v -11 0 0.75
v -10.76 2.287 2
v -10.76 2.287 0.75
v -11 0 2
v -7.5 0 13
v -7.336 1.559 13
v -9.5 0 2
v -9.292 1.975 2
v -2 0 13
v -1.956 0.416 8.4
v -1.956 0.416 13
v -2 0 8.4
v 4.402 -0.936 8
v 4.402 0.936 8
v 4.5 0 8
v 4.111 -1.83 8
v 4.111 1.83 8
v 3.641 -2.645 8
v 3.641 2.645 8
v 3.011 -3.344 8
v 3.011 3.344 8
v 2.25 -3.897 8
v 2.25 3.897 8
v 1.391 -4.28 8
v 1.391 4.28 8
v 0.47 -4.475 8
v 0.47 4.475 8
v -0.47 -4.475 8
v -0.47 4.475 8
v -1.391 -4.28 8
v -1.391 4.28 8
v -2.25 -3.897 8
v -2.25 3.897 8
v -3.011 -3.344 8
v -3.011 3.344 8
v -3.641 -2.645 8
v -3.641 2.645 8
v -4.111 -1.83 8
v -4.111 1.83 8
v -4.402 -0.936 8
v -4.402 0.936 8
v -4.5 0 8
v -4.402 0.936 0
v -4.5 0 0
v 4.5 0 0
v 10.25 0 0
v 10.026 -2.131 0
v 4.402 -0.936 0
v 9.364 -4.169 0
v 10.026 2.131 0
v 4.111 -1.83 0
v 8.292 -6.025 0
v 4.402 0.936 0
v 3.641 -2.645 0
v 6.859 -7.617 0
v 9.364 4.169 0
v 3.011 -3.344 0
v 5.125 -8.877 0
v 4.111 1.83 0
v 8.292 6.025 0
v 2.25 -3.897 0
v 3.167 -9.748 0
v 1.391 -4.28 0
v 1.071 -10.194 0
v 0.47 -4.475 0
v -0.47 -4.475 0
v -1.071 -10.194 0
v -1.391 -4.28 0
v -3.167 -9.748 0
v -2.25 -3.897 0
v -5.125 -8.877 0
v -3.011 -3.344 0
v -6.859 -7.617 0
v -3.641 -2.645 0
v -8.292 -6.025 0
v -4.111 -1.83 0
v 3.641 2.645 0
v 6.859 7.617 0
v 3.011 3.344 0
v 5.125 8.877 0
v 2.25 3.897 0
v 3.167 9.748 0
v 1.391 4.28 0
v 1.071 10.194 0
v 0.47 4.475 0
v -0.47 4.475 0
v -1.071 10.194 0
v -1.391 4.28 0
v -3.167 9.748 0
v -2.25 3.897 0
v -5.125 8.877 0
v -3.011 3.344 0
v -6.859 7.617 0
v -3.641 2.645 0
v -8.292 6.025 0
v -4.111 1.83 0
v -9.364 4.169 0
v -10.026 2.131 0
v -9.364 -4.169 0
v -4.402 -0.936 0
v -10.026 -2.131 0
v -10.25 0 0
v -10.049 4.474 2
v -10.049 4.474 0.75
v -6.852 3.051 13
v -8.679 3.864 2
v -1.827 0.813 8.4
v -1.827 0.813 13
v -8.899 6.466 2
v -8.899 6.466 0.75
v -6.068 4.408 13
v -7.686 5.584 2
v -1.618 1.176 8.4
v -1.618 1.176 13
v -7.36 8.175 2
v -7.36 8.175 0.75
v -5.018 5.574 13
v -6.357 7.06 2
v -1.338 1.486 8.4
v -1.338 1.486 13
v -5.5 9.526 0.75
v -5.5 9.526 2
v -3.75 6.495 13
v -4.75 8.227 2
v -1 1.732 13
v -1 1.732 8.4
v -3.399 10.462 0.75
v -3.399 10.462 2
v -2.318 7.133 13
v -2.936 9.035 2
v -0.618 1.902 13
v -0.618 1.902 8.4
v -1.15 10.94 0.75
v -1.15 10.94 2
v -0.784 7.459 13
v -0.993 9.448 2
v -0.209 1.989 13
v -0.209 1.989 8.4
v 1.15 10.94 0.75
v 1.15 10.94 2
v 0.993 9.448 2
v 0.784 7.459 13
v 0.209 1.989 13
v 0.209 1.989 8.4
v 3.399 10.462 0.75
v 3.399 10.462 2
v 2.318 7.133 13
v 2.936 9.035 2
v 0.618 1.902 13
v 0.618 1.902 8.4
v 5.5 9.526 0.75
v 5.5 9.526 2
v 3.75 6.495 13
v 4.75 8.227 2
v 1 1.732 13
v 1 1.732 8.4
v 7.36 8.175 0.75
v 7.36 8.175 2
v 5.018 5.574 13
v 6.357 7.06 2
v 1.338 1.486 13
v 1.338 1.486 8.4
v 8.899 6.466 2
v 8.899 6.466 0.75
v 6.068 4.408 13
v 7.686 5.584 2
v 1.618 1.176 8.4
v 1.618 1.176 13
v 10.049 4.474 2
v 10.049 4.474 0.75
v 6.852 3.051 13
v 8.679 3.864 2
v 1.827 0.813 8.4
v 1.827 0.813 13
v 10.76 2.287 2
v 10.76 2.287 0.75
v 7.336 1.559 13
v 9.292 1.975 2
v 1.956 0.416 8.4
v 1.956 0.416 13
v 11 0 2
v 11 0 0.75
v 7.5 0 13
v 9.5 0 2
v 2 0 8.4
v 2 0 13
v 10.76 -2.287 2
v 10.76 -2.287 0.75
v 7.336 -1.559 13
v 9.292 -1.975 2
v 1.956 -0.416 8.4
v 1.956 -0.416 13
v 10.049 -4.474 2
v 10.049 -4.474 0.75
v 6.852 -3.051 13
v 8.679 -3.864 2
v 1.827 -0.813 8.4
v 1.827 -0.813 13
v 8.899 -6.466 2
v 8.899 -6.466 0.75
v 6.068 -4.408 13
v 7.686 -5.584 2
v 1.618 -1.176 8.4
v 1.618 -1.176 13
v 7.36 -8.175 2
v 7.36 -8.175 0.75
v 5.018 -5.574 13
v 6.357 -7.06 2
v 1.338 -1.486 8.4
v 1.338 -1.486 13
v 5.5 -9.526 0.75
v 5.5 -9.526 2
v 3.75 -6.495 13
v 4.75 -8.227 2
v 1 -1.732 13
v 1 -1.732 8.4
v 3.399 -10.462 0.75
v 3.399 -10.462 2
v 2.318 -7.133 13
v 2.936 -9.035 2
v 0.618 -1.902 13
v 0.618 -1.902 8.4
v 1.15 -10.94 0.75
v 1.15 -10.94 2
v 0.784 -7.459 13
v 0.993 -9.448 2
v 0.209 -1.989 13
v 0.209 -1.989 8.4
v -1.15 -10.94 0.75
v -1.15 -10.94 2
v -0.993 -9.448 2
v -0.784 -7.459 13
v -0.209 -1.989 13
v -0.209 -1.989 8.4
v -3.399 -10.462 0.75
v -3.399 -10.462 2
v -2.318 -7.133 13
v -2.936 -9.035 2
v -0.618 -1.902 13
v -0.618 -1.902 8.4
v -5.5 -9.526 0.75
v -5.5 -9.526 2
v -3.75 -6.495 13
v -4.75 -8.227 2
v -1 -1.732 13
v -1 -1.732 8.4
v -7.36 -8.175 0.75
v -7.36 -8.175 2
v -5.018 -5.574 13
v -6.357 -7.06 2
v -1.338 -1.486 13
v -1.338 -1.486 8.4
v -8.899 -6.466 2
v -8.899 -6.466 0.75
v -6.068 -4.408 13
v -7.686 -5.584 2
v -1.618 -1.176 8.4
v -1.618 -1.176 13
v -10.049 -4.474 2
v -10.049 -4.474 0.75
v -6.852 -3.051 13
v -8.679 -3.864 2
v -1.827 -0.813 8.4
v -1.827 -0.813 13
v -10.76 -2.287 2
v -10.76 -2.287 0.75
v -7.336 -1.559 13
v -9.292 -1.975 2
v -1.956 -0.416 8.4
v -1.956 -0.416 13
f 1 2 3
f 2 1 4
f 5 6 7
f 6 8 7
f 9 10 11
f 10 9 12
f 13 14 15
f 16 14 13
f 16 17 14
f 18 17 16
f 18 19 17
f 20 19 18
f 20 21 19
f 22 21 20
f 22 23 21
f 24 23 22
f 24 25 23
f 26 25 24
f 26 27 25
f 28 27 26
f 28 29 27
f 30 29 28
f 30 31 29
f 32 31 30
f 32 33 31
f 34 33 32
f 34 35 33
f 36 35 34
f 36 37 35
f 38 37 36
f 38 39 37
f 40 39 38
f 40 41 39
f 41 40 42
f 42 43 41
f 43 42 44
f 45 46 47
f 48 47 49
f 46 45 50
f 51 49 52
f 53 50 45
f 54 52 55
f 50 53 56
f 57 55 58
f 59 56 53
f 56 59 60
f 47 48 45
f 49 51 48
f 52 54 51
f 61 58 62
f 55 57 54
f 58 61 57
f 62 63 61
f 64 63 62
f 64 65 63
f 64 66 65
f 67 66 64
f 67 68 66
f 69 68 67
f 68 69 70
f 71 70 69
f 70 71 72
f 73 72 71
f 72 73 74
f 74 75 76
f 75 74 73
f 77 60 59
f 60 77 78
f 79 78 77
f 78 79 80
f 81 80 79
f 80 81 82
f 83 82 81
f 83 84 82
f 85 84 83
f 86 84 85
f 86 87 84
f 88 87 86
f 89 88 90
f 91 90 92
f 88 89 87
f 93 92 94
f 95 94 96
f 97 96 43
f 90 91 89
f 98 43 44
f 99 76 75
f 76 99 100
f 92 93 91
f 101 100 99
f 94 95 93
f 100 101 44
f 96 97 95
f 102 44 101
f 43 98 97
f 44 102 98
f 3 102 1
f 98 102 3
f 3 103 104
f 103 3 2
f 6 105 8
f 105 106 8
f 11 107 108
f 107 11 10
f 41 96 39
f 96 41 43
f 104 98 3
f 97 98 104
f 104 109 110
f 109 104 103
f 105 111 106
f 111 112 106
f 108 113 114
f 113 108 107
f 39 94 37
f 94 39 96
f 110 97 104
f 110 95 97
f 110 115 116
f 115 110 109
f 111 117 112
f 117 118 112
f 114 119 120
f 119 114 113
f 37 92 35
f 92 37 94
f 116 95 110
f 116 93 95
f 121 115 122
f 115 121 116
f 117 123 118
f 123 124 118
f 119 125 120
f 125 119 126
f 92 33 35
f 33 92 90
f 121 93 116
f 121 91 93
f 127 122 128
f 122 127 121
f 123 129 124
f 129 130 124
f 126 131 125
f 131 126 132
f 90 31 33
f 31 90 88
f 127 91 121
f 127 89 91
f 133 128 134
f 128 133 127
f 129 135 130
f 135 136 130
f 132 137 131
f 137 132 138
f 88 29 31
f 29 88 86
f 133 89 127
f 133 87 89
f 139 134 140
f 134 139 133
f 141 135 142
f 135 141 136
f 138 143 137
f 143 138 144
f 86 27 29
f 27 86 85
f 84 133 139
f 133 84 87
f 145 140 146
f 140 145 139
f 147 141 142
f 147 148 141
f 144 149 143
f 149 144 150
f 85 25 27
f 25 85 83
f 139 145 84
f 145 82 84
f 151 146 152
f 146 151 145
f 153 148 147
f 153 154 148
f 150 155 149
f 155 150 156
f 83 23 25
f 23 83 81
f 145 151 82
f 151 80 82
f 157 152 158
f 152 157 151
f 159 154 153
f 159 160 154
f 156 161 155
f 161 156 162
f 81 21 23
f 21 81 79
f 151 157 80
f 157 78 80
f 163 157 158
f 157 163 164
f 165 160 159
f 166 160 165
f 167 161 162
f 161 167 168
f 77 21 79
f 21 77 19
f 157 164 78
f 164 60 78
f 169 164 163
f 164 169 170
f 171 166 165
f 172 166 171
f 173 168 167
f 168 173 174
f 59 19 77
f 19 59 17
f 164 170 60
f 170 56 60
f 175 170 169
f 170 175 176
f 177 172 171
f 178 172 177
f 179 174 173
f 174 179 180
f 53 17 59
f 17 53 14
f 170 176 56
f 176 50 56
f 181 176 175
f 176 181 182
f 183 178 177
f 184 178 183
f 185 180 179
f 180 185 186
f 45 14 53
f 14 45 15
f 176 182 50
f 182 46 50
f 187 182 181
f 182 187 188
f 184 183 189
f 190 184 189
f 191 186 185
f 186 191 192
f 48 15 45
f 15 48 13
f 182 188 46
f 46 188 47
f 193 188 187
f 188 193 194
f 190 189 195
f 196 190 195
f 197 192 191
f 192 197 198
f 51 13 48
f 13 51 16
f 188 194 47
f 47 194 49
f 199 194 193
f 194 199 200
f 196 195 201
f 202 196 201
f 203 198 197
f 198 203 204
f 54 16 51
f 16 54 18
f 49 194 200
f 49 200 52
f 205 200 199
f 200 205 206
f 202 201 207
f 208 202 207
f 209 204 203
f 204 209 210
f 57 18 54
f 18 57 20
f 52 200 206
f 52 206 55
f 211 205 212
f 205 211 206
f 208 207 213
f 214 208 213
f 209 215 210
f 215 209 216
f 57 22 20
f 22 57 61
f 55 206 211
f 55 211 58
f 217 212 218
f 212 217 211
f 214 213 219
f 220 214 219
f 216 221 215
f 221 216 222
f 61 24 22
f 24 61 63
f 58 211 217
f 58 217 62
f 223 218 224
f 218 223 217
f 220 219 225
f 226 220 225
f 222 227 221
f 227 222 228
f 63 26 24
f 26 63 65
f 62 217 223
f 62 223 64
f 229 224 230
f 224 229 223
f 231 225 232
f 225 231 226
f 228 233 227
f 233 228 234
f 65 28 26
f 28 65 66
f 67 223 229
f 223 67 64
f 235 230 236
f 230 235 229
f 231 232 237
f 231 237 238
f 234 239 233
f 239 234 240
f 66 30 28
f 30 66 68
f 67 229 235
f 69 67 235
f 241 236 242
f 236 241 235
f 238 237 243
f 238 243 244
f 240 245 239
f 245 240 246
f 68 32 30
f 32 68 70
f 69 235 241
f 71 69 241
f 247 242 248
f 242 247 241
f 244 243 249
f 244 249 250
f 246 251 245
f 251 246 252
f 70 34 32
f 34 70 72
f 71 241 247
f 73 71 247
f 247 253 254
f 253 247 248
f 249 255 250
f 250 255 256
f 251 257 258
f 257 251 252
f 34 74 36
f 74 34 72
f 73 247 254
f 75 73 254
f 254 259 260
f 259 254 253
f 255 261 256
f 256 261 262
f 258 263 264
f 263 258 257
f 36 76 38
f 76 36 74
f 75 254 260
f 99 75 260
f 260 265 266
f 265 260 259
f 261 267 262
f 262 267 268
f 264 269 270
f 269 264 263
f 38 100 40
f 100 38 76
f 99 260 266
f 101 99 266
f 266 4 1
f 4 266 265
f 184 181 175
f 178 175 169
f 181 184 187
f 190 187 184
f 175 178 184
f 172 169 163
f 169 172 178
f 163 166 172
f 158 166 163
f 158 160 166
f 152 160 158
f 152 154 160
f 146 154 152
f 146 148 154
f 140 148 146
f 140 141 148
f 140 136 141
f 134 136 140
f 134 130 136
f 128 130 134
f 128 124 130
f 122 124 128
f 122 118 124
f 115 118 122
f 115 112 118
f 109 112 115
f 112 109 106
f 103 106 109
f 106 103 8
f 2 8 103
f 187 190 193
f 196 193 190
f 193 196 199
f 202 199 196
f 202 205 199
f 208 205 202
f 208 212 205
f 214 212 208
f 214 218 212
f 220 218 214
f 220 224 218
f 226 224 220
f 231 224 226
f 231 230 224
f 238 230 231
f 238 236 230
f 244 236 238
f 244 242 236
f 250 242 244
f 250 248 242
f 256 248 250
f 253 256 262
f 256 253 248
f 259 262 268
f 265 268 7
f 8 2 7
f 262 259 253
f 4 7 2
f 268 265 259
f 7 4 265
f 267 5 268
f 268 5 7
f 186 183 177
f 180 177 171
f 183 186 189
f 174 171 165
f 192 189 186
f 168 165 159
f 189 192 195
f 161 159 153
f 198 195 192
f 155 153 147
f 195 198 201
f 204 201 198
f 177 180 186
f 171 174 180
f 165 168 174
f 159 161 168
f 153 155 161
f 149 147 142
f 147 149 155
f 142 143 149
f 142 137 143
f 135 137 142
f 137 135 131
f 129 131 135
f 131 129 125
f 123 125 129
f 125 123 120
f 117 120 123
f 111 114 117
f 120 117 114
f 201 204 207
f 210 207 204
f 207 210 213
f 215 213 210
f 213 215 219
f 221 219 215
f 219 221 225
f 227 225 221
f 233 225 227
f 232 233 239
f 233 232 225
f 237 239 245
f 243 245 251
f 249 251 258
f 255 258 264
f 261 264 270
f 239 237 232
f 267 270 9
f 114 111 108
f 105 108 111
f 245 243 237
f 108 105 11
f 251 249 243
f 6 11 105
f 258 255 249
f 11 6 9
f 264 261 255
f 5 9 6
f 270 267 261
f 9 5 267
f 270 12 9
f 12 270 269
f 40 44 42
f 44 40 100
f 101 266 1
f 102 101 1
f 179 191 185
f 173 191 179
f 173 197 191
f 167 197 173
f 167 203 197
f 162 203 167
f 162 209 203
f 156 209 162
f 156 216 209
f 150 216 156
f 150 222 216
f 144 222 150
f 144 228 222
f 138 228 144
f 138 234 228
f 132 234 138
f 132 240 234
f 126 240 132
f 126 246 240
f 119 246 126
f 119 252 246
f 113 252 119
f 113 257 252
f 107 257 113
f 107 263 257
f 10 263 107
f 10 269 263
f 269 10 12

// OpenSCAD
/*
 * Pipe (or Scooter Handle) Plug (Parametric), v0.42
 *
 * by Alex Franke (CodeCreations), Jan 2013
 * http://www.theFrankes.com
 * 
 * Licenced under Creative Commons Attribution - Non-Commercial - Share Alike 3.0 
 * 
 * DESCRIPTION: This is a parametric plug that can be used with an elastic cord to 
 *   cover the end of a pipe. Using the default settings, it fits the ends of the 
 *   handles of my kids' Razor kick scooters. 
 * 
 * INSTRUCTIONS: Choose some values in the "User-defined values" section if 
 *   necessary, render, and print. Drill out the internal bridging, if necessary. 
 *     To replace an existing plug, grab the elastic band and clamp the end so it 
 *   doesn't to into the pipe. (I used a clothes pin.) Drill out the old plug if 
 *   necessary. Untie or cut the knot at the end of the elastic, thread it though 
 *   the new plug, and re-tie. You may need to file the inside of the tube a bit 
 *   if its really banged up. 
 * 
 * v0.42, Jan 20, 2013: Initial Release.
 * 
 * TODO: 
 *   * None at this time
 */

/////////////////////////////////////////////////////////////////////////////
// User-defined values... 
/////////////////////////////////////////////////////////////////////////////

// Diameter of the through hole. This should be big enough to fit the elastic through. 
throughHoleDiameter = 4; 

// Diameter of the opening that holds the knot in place. 
knotHoleDiameter = 9; 

// Depth of the opening that holds the knot in place
knotHoleDepth = 8; 

// Inside diameter of the pipe you're plugging 
pipeID = 19; 

// Outside diameter of the pipe you're plugging 
pipeOD = 22; 

// The distance (from the outside) of the chamber
chamferDistance = 0.75;

// The difference in radius between the top of the taper and the bottom
taperDistance = 2; 

// The distance the plug protrudes from the end of the pipe
outset = 2; 

// The thickness of the bridge layer on the inside (to support the smaller through-hole).
bridgeThickness = 0.4; 

// The total height of the plug 
totalHeight = 13; 


/////////////////////////////////////////////////////////////////////////////
// The code... 
/////////////////////////////////////////////////////////////////////////////

union() {
	rotate_extrude() 
		polygon(points=[
			[knotHoleDiameter/2,0],
			[knotHoleDiameter/2,knotHoleDepth],
			[throughHoleDiameter/2,knotHoleDepth],
			[throughHoleDiameter/2,totalHeight],
			[pipeID/2-taperDistance,totalHeight],
			[pipeID/2,outset],
			[pipeOD/2,outset],
			[pipeOD/2,chamferDistance],
			[pipeOD/2-chamferDistance,0],
			[knotHoleDiameter/2,0]
			]); 
	
	// bridge material 
	translate([0,0,knotHoleDepth]) 
		cylinder(h=bridgeThickness, r=knotHoleDiameter/2) ;
}
